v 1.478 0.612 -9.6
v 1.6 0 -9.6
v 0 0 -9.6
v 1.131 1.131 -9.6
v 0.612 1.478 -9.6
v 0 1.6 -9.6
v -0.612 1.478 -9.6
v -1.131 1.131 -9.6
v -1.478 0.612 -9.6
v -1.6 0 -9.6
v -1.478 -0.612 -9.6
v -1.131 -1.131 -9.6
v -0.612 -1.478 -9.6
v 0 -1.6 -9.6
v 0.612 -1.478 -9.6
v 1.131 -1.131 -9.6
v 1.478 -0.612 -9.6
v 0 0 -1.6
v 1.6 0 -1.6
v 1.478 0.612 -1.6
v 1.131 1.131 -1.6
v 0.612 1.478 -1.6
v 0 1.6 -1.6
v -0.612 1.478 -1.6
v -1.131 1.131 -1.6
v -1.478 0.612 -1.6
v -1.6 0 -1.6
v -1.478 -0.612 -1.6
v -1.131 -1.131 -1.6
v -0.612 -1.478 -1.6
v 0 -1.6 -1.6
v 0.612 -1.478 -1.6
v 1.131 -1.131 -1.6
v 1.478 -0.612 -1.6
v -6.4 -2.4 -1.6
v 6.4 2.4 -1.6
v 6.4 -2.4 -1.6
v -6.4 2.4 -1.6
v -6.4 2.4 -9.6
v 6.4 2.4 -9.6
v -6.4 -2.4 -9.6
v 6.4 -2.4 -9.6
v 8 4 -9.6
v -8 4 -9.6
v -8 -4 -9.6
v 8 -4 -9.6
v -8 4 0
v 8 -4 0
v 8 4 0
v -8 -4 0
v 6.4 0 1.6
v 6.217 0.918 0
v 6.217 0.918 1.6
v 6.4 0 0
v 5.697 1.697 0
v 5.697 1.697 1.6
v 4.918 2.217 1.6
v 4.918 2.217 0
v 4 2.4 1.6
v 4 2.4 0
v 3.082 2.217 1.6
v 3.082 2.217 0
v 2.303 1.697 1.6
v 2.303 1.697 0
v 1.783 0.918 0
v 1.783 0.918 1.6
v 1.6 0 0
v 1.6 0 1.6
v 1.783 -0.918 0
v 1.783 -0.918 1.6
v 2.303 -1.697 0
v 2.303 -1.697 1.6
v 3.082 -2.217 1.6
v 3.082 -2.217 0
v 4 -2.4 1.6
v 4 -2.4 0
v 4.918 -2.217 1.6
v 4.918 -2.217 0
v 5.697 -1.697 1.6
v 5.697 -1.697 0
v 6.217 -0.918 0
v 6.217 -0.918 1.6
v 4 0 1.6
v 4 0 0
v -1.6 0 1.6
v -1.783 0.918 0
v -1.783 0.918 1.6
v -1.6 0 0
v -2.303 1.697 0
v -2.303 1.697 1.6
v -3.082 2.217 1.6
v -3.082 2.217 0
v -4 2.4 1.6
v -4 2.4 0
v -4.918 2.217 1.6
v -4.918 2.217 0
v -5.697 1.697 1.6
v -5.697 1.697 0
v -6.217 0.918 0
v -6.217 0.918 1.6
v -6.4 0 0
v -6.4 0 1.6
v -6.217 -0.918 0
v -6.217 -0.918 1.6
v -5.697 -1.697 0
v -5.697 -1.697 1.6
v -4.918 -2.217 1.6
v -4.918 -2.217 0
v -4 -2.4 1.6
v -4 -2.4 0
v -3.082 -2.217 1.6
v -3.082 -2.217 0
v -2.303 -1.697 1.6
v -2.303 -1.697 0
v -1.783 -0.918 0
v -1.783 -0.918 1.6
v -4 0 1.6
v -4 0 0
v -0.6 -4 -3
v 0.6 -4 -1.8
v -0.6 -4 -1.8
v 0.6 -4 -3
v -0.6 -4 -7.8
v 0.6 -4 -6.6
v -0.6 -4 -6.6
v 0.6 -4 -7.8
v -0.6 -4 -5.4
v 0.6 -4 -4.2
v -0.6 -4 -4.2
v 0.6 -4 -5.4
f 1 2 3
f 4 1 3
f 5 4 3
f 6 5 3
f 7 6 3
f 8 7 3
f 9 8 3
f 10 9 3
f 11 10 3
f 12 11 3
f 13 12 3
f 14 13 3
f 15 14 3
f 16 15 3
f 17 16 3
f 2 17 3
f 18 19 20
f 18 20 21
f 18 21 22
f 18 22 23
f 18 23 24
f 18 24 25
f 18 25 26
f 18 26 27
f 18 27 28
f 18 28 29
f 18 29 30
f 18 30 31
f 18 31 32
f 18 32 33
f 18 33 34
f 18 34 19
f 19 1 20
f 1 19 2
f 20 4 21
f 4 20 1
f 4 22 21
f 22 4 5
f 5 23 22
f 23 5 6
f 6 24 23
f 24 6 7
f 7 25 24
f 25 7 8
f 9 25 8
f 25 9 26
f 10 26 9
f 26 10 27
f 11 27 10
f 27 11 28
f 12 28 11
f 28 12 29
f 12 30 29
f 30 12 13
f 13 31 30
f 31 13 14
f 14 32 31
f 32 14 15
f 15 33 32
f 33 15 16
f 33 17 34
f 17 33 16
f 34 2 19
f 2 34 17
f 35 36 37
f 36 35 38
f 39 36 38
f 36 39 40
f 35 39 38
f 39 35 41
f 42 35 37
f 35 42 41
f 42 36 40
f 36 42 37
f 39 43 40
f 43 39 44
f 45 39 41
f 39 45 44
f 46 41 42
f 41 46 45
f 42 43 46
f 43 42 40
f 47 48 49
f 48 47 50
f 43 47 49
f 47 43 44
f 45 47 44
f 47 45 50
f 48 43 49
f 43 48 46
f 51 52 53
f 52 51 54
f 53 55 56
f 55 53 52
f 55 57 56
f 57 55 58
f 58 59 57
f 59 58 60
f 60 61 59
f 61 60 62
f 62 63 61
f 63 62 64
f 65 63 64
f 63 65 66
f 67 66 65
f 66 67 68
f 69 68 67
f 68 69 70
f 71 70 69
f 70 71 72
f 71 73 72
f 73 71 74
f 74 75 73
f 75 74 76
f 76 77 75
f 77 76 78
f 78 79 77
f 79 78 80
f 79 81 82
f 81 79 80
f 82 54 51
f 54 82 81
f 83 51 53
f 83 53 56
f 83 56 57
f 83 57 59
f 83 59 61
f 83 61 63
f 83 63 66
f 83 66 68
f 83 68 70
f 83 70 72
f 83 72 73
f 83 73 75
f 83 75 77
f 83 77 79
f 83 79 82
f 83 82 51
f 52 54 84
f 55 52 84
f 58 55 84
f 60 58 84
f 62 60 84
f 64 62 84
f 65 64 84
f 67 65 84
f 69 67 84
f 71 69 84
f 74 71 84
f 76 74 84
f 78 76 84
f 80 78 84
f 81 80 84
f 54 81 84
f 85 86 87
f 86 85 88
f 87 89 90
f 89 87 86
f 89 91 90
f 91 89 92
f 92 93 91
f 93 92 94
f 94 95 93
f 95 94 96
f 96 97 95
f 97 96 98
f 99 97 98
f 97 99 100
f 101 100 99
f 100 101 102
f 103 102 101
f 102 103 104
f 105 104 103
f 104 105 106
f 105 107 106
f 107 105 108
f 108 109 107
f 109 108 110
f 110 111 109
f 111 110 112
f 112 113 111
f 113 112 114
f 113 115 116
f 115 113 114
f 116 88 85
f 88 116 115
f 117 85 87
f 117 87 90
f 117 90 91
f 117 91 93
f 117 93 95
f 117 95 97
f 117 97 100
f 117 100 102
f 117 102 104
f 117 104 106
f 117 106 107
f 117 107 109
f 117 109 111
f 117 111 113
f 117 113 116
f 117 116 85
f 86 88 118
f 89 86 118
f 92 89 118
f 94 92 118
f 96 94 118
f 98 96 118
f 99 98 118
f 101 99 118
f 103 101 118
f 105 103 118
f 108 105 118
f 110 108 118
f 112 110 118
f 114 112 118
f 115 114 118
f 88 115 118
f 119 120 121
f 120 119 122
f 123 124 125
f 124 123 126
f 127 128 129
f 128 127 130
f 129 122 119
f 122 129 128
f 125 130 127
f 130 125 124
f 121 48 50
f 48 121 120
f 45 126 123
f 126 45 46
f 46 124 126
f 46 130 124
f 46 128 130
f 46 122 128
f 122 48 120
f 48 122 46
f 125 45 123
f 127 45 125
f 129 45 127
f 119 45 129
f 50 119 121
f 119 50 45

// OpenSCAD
// file: ../p/4-4edge.scad
use <../lib.scad>
function ldraw_lib__4_4edge() = [
// 0 Circle 1.0
// 0 Name: 4-4edge.dat
// 0 Author: James Jessiman
// 0 !LDRAW_ORG Primitive UPDATE 2017-01
// 0 !LICENSE Licensed under CC BY 2.0 and CC BY 4.0 : see CAreadme.txt
// 
// 0 BFC CERTIFY CCW
  [0,"BFC","CERTIFY"],
  [0,"BFC","CCW"],
// 
// 0 !HISTORY 1998-12-15 [PTadmin] Official Update 1998-10
// 0 !HISTORY 2005-12-28 [PTadmin] Official Update 2005-01
// 0 !HISTORY 2007-06-24 [PTadmin] Header formatted for Contributor Agreement
// 0 !HISTORY 2008-07-01 [PTadmin] Official Update 2008-01
// 0 !HISTORY 2017-01-15 [Steffen] BFCed
// 0 !HISTORY 2017-12-30 [PTadmin] Official Update 2017-01
// 
// 
// 2 24 1 0 0 0.9239 0 0.3827
  [2,24,1,0,0,0.9239,0,0.3827],
// 2 24 0.9239 0 0.3827 0.7071 0 0.7071
  [2,24,0.9239,0,0.3827,0.7071,0,0.7071],
// 2 24 0.7071 0 0.7071 0.3827 0 0.9239
  [2,24,0.7071,0,0.7071,0.3827,0,0.9239],
// 2 24 0.3827 0 0.9239 0 0 1
  [2,24,0.3827,0,0.9239,0,0,1],
// 2 24 0 0 1 -0.3827 0 0.9239
  [2,24,0,0,1,-0.3827,0,0.9239],
// 2 24 -0.3827 0 0.9239 -0.7071 0 0.7071
  [2,24,-0.3827,0,0.9239,-0.7071,0,0.7071],
// 2 24 -0.7071 0 0.7071 -0.9239 0 0.3827
  [2,24,-0.7071,0,0.7071,-0.9239,0,0.3827],
// 2 24 -0.9239 0 0.3827 -1 0 -0
  [2,24,-0.9239,0,0.3827,-1,0,-0],
// 2 24 -1 0 -0 -0.9239 0 -0.3827
  [2,24,-1,0,-0,-0.9239,0,-0.3827],
// 2 24 -0.9239 0 -0.3827 -0.7071 0 -0.7071
  [2,24,-0.9239,0,-0.3827,-0.7071,0,-0.7071],
// 2 24 -0.7071 0 -0.7071 -0.3827 0 -0.9239
  [2,24,-0.7071,0,-0.7071,-0.3827,0,-0.9239],
// 2 24 -0.3827 0 -0.9239 0 0 -1
  [2,24,-0.3827,0,-0.9239,0,0,-1],
// 2 24 0 0 -1 0.3827 0 -0.9239
  [2,24,0,0,-1,0.3827,0,-0.9239],
// 2 24 0.3827 0 -0.9239 0.7071 0 -0.7071
  [2,24,0.3827,0,-0.9239,0.7071,0,-0.7071],
// 2 24 0.7071 0 -0.7071 0.9239 0 -0.3827
  [2,24,0.7071,0,-0.7071,0.9239,0,-0.3827],
// 2 24 0.9239 0 -0.3827 1 0 0
  [2,24,0.9239,0,-0.3827,1,0,0],
];
module ldraw_lib__4_4edge(step=0, col=false, unit=2/5, alt=false, line=0.2, solid=!$preview)
    makepoly(ldraw_lib__4_4edge(), step=step, col=col, unit=unit, alt=alt, line=line, solid=solid);
ldraw_lib__4_4edge(line=0.2);
// file: ../p/4-4disc.scad
use <../lib.scad>
function ldraw_lib__4_4disc() = [
// 0 Disc 1.0
// 0 Name: 4-4disc.dat
// 0 Author: James Jessiman
// 0 !LDRAW_ORG Primitive UPDATE 2002-02
// 0 !LICENSE Licensed under CC BY 2.0 and CC BY 4.0 : see CAreadme.txt
// 
// 0 BFC CERTIFY CCW
  [0,"BFC","CERTIFY"],
  [0,"BFC","CCW"],
// 
// 0 !HISTORY 1998-12-15 [PTadmin] Official Update 1998-10
// 0 !HISTORY 2002-03-23 [sbliss] Added BFC statement
// 0 !HISTORY 2002-04-25 [PTadmin] Official Update 2002-02
// 0 !HISTORY 2007-06-24 [PTadmin] Header formatted for Contributor Agreement
// 0 !HISTORY 2008-07-01 [PTadmin] Official Update 2008-01
// 
// 
// 3 16 0 0 0 1 0 0 0.9239 0 0.3827
  [3,16,0,0,0,1,0,0,0.9239,0,0.3827],
// 3 16 0 0 0 0.9239 0 0.3827 0.7071 0 0.7071
  [3,16,0,0,0,0.9239,0,0.3827,0.7071,0,0.7071],
// 3 16 0 0 0 0.7071 0 0.7071 0.3827 0 0.9239
  [3,16,0,0,0,0.7071,0,0.7071,0.3827,0,0.9239],
// 3 16 0 0 0 0.3827 0 0.9239 0 0 1
  [3,16,0,0,0,0.3827,0,0.9239,0,0,1],
// 3 16 0 0 0 0 0 1 -0.3827 0 0.9239
  [3,16,0,0,0,0,0,1,-0.3827,0,0.9239],
// 3 16 0 0 0 -0.3827 0 0.9239 -0.7071 0 0.7071
  [3,16,0,0,0,-0.3827,0,0.9239,-0.7071,0,0.7071],
// 3 16 0 0 0 -0.7071 0 0.7071 -0.9239 0 0.3827
  [3,16,0,0,0,-0.7071,0,0.7071,-0.9239,0,0.3827],
// 3 16 0 0 0 -0.9239 0 0.3827 -1 0 -0
  [3,16,0,0,0,-0.9239,0,0.3827,-1,0,-0],
// 3 16 0 0 0 -1 0 -0 -0.9239 0 -0.3827
  [3,16,0,0,0,-1,0,-0,-0.9239,0,-0.3827],
// 3 16 0 0 0 -0.9239 0 -0.3827 -0.7071 0 -0.7071
  [3,16,0,0,0,-0.9239,0,-0.3827,-0.7071,0,-0.7071],
// 3 16 0 0 0 -0.7071 0 -0.7071 -0.3827 0 -0.9239
  [3,16,0,0,0,-0.7071,0,-0.7071,-0.3827,0,-0.9239],
// 3 16 0 0 0 -0.3827 0 -0.9239 0 0 -1
  [3,16,0,0,0,-0.3827,0,-0.9239,0,0,-1],
// 3 16 0 0 0 0 0 -1 0.3827 0 -0.9239
  [3,16,0,0,0,0,0,-1,0.3827,0,-0.9239],
// 3 16 0 0 0 0.3827 0 -0.9239 0.7071 0 -0.7071
  [3,16,0,0,0,0.3827,0,-0.9239,0.7071,0,-0.7071],
// 3 16 0 0 0 0.7071 0 -0.7071 0.9239 0 -0.3827
  [3,16,0,0,0,0.7071,0,-0.7071,0.9239,0,-0.3827],
// 3 16 0 0 0 0.9239 0 -0.3827 1 0 0
  [3,16,0,0,0,0.9239,0,-0.3827,1,0,0],
// 0
];
module ldraw_lib__4_4disc(step=0, col=false, unit=2/5, alt=false, line=0.2, solid=!$preview)
    makepoly(ldraw_lib__4_4disc(), step=step, col=col, unit=unit, alt=alt, line=line, solid=solid);
ldraw_lib__4_4disc(line=0.2);
// file: ../p/4-4cyli.scad
use <../lib.scad>
function ldraw_lib__4_4cyli() = [
// 0 Cylinder 1.0
// 0 Name: 4-4cyli.dat
// 0 Author: James Jessiman
// 0 !LDRAW_ORG Primitive UPDATE 2005-01
// 0 !LICENSE Licensed under CC BY 4.0 : see CAreadme.txt
// 
// 0 BFC CERTIFY CCW
  [0,"BFC","CERTIFY"],
  [0,"BFC","CCW"],
// 
// 0 !HISTORY 1998-12-15 [PTadmin] Official Update 1998-10
// 0 !HISTORY 2002-03-23 [sbliss] Added BFC statement; merged headers from files in distributions LDraw 0.27 and Complete.
// 0 !HISTORY 2002-04-25 [PTadmin] Official Update 2002-02
// 0 !HISTORY 2004-12-14 [guyvivan] BFC CCW
// 0 !HISTORY 2005-12-28 [PTadmin] Official Update 2005-01
// 0 !HISTORY 2007-06-24 [PTadmin] Header formatted for Contributor Agreement
// 0 !HISTORY 2008-07-01 [PTadmin] Official Update 2008-01
// 
// 
// 4 16 1 1 0 0.9239 1 0.3827 0.9239 0 0.3827 1 0 0
  [4,16,1,1,0,0.9239,1,0.3827,0.9239,0,0.3827,1,0,0],
// 5 24 1 0 0 1 1 0 0.9239 0 0.3827 0.9239 0 -0.3827
  [5,24,1,0,0,1,1,0,0.9239,0,0.3827,0.9239,0,-0.3827],
// 4 16 0.9239 1 0.3827 0.7071 1 0.7071 0.7071 0 0.7071 0.9239 0 0.3827
  [4,16,0.9239,1,0.3827,0.7071,1,0.7071,0.7071,0,0.7071,0.9239,0,0.3827],
// 5 24 0.9239 0 0.3827 0.9239 1 0.3827 0.7071 0 0.7071 1 0 0
  [5,24,0.9239,0,0.3827,0.9239,1,0.3827,0.7071,0,0.7071,1,0,0],
// 4 16 0.7071 1 0.7071 0.3827 1 0.9239 0.3827 0 0.9239 0.7071 0 0.7071
  [4,16,0.7071,1,0.7071,0.3827,1,0.9239,0.3827,0,0.9239,0.7071,0,0.7071],
// 5 24 0.7071 0 0.7071 0.7071 1 0.7071 0.3827 0 0.9239 0.9239 0 0.3827
  [5,24,0.7071,0,0.7071,0.7071,1,0.7071,0.3827,0,0.9239,0.9239,0,0.3827],
// 4 16 0.3827 1 0.9239 0 1 1 0 0 1 0.3827 0 0.9239
  [4,16,0.3827,1,0.9239,0,1,1,0,0,1,0.3827,0,0.9239],
// 5 24 0.3827 0 0.9239 0.3827 1 0.9239 0 0 1 0.7071 0 0.7071
  [5,24,0.3827,0,0.9239,0.3827,1,0.9239,0,0,1,0.7071,0,0.7071],
// 4 16 0 1 1 -0.3827 1 0.9239 -0.3827 0 0.9239 0 0 1
  [4,16,0,1,1,-0.3827,1,0.9239,-0.3827,0,0.9239,0,0,1],
// 5 24 0 0 1 0 1 1 -0.3827 0 0.9239 0.3827 0 0.9239
  [5,24,0,0,1,0,1,1,-0.3827,0,0.9239,0.3827,0,0.9239],
// 4 16 -0.3827 1 0.9239 -0.7071 1 0.7071 -0.7071 0 0.7071 -0.3827 0 0.9239
  [4,16,-0.3827,1,0.9239,-0.7071,1,0.7071,-0.7071,0,0.7071,-0.3827,0,0.9239],
// 5 24 -0.3827 0 0.9239 -0.3827 1 0.9239 -0.7071 0 0.7071 0 0 1
  [5,24,-0.3827,0,0.9239,-0.3827,1,0.9239,-0.7071,0,0.7071,0,0,1],
// 4 16 -0.7071 1 0.7071 -0.9239 1 0.3827 -0.9239 0 0.3827 -0.7071 0 0.7071
  [4,16,-0.7071,1,0.7071,-0.9239,1,0.3827,-0.9239,0,0.3827,-0.7071,0,0.7071],
// 5 24 -0.7071 0 0.7071 -0.7071 1 0.7071 -0.9239 0 0.3827 -0.3827 0 0.9239
  [5,24,-0.7071,0,0.7071,-0.7071,1,0.7071,-0.9239,0,0.3827,-0.3827,0,0.9239],
// 4 16 -0.9239 1 0.3827 -1 1 0 -1 0 0 -0.9239 0 0.3827
  [4,16,-0.9239,1,0.3827,-1,1,0,-1,0,0,-0.9239,0,0.3827],
// 5 24 -0.9239 0 0.3827 -0.9239 1 0.3827 -1 0 0 -0.7071 0 0.7071
  [5,24,-0.9239,0,0.3827,-0.9239,1,0.3827,-1,0,0,-0.7071,0,0.7071],
// 4 16 -1 1 0 -0.9239 1 -0.3827 -0.9239 0 -0.3827 -1 0 0
  [4,16,-1,1,0,-0.9239,1,-0.3827,-0.9239,0,-0.3827,-1,0,0],
// 5 24 -1 0 0 -1 1 0 -0.9239 0 -0.3827 -0.9239 0 0.3827
  [5,24,-1,0,0,-1,1,0,-0.9239,0,-0.3827,-0.9239,0,0.3827],
// 4 16 -0.9239 1 -0.3827 -0.7071 1 -0.7071 -0.7071 0 -0.7071 -0.9239 0 -0.3827
  [4,16,-0.9239,1,-0.3827,-0.7071,1,-0.7071,-0.7071,0,-0.7071,-0.9239,0,-0.3827],
// 5 24 -0.9239 0 -0.3827 -0.9239 1 -0.3827 -0.7071 0 -0.7071 -1 0 0
  [5,24,-0.9239,0,-0.3827,-0.9239,1,-0.3827,-0.7071,0,-0.7071,-1,0,0],
// 4 16 -0.7071 1 -0.7071 -0.3827 1 -0.9239 -0.3827 0 -0.9239 -0.7071 0 -0.7071
  [4,16,-0.7071,1,-0.7071,-0.3827,1,-0.9239,-0.3827,0,-0.9239,-0.7071,0,-0.7071],
// 5 24 -0.7071 0 -0.7071 -0.7071 1 -0.7071 -0.3827 0 -0.9239 -0.9239 0 -0.3827
  [5,24,-0.7071,0,-0.7071,-0.7071,1,-0.7071,-0.3827,0,-0.9239,-0.9239,0,-0.3827],
// 4 16 -0.3827 1 -0.9239 0 1 -1 0 0 -1 -0.3827 0 -0.9239
  [4,16,-0.3827,1,-0.9239,0,1,-1,0,0,-1,-0.3827,0,-0.9239],
// 5 24 -0.3827 0 -0.9239 -0.3827 1 -0.9239 0 0 -1 -0.7071 0 -0.7071
  [5,24,-0.3827,0,-0.9239,-0.3827,1,-0.9239,0,0,-1,-0.7071,0,-0.7071],
// 4 16 0 1 -1 0.3827 1 -0.9239 0.3827 0 -0.9239 0 0 -1
  [4,16,0,1,-1,0.3827,1,-0.9239,0.3827,0,-0.9239,0,0,-1],
// 5 24 0 0 -1 0 1 -1 0.3827 0 -0.9239 -0.3827 0 -0.9239
  [5,24,0,0,-1,0,1,-1,0.3827,0,-0.9239,-0.3827,0,-0.9239],
// 4 16 0.3827 1 -0.9239 0.7071 1 -0.7071 0.7071 0 -0.7071 0.3827 0 -0.9239
  [4,16,0.3827,1,-0.9239,0.7071,1,-0.7071,0.7071,0,-0.7071,0.3827,0,-0.9239],
// 5 24 0.3827 0 -0.9239 0.3827 1 -0.9239 0.7071 0 -0.7071 0 0 -1
  [5,24,0.3827,0,-0.9239,0.3827,1,-0.9239,0.7071,0,-0.7071,0,0,-1],
// 4 16 0.7071 1 -0.7071 0.9239 1 -0.3827 0.9239 0 -0.3827 0.7071 0 -0.7071
  [4,16,0.7071,1,-0.7071,0.9239,1,-0.3827,0.9239,0,-0.3827,0.7071,0,-0.7071],
// 5 24 0.7071 0 -0.7071 0.7071 1 -0.7071 0.9239 0 -0.3827 0.3827 0 -0.9239
  [5,24,0.7071,0,-0.7071,0.7071,1,-0.7071,0.9239,0,-0.3827,0.3827,0,-0.9239],
// 4 16 0.9239 1 -0.3827 1 1 0 1 0 0 0.9239 0 -0.3827
  [4,16,0.9239,1,-0.3827,1,1,0,1,0,0,0.9239,0,-0.3827],
// 5 24 0.9239 0 -0.3827 0.9239 1 -0.3827 1 0 0 0.7071 0 -0.7071
  [5,24,0.9239,0,-0.3827,0.9239,1,-0.3827,1,0,0,0.7071,0,-0.7071],
// 0
];
module ldraw_lib__4_4cyli(step=0, col=false, unit=2/5, alt=false, line=0.2, solid=!$preview)
    makepoly(ldraw_lib__4_4cyli(), step=step, col=col, unit=unit, alt=alt, line=line, solid=solid);
ldraw_lib__4_4cyli(line=0.2);
// file: ../p/stud3.scad
use <../lib.scad>
use <4-4cyli.scad>
use <4-4disc.scad>
use <4-4edge.scad>
function ldraw_lib__stud3() = [
// 0 Stud Tube Solid
// 0 Name: stud3.dat
// 0 Author: James Jessiman
// 0 !LDRAW_ORG Primitive UPDATE 2012-01
// 0 !LICENSE Licensed under CC BY 4.0 : see CAreadme.txt
// 
// 0 BFC CERTIFY CCW
  [0,"BFC","CERTIFY"],
  [0,"BFC","CCW"],
// 
// 0 !HISTORY 2002-04-04 [sbliss] Modified for BFC compliance
// 0 !HISTORY 2002-04-25 [PTadmin] Official Update 2002-02
// 0 !HISTORY 2007-06-24 [PTadmin] Header formatted for Contributor Agreement
// 0 !HISTORY 2008-07-01 [PTadmin] Official Update 2008-01
// 0 !HISTORY 2012-02-16 [Philo] Changed to CCW
// 0 !HISTORY 2012-03-30 [PTadmin] Official Update 2012-01
// 
// 
// 1 16 0 -4 0 4 0 0 0 1 0 0 0 4 4-4edge.dat
  [1,16,0,-4,0,4,0,0,0,1,0,0,0,4, ldraw_lib__4_4edge()],
// 1 16 0 0 0 4 0 0 0 1 0 0 0 4 4-4edge.dat
  [1,16,0,0,0,4,0,0,0,1,0,0,0,4, ldraw_lib__4_4edge()],
// 1 16 0 -4 0 4 0 0 0 1 0 0 0 4 4-4disc.dat
  [1,16,0,-4,0,4,0,0,0,1,0,0,0,4, ldraw_lib__4_4disc()],
  [-1,16,0,0,0,4,0,0,0,-1,0,0,0,4, ldraw_lib__4_4disc()],
// 1 16 0 -4 0 4 0 0 0 4 0 0 0 4 4-4cyli.dat
  [1,16,0,-4,0,4,0,0,0,4,0,0,0,4, ldraw_lib__4_4cyli()],
];
module ldraw_lib__stud3(step=0, col=false, unit=2/5, alt=false, line=0.2, solid=!$preview)
    makepoly(ldraw_lib__stud3(), step=step, col=col, unit=unit, alt=alt, line=line, solid=solid);
ldraw_lib__stud3(line=0.2);
// file: ../p/stud.scad
use <../lib.scad>
use <4-4cyli.scad>
use <4-4disc.scad>
use <4-4edge.scad>
function ldraw_lib__stud() = [
// 0 Stud
// 0 Name: stud.dat
// 0 Author: James Jessiman
// 0 !LDRAW_ORG Primitive UPDATE 2012-01
// 0 !LICENSE Licensed under CC BY 4.0 : see CAreadme.txt
// 
// 0 BFC CERTIFY CCW
  [0,"BFC","CERTIFY"],
  [0,"BFC","CCW"],
// 
// 0 !HISTORY 2002-04-04 [sbliss] Modified for BFC compliance
// 0 !HISTORY 2002-04-25 [PTadmin] Official Update 2002-02
// 0 !HISTORY 2007-06-24 [PTadmin] Header formatted for Contributor Agreement
// 0 !HISTORY 2008-07-01 [PTadmin] Official Update 2008-01
// 0 !HISTORY 2012-02-16 [Philo] Changed to CCW
// 0 !HISTORY 2012-03-30 [PTadmin] Official Update 2012-01
// 
// 
// 1 16 0 0 0 6 0 0 0 1 0 0 0 6 4-4edge.dat
  [1,16,0,0,0,6,0,0,0,1,0,0,0,6, ldraw_lib__4_4edge()],
// 1 16 0 -4 0 6 0 0 0 1 0 0 0 6 4-4edge.dat
  [1,16,0,-4,0,6,0,0,0,1,0,0,0,6, ldraw_lib__4_4edge()],
// 1 16 0 0 0 6 0 0 0 -4 0 0 0 6 4-4cyli.dat
  [1,16,0,0,0,6,0,0,0,-4,0,0,0,6, ldraw_lib__4_4cyli()],
// 1 16 0 -4 0 6 0 0 0 1 0 0 0 6 4-4disc.dat
  [1,16,0,-4,0,6,0,0,0,1,0,0,0,6, ldraw_lib__4_4disc()],
  [-1,16,0,0,0,6,0,0,0,-1,0,0,0,6, ldraw_lib__4_4disc()],
];
module ldraw_lib__stud(step=0, col=false, unit=2/5, alt=false, line=0.2, solid=!$preview)
    makepoly(ldraw_lib__stud(), step=step, col=col, unit=unit, alt=alt, line=line, solid=solid);
ldraw_lib__stud(line=0.2);
// file: ../p/box5.scad
use <../lib.scad>
function ldraw_lib__box5() = [
// 0 Box with 5 Faces and All Edges
// 0 Name: box5.dat
// 0 Author: James Jessiman
// 0 !LDRAW_ORG Primitive UPDATE 2012-01
// 0 !LICENSE Licensed under CC BY 2.0 and CC BY 4.0 : see CAreadme.txt
// 
// 0 BFC CERTIFY CCW
  [0,"BFC","CERTIFY"],
  [0,"BFC","CCW"],
// 
// 0 !HISTORY 2002-04-03 [sbliss] Modified for BFC compliance
// 0 !HISTORY 2002-04-25 [PTadmin] Official Update 2002-02
// 0 !HISTORY 2007-06-24 [PTadmin] Header formatted for Contributor Agreement
// 0 !HISTORY 2008-07-01 [PTadmin] Official Update 2008-01
// 0 !HISTORY 2012-02-16 [Philo] Changed to CCW
// 0 !HISTORY 2012-03-30 [PTadmin] Official Update 2012-01
// 
// 
// 2 24 1 1 1 -1 1 1
  [2,24,1,1,1,-1,1,1],
// 2 24 -1 1 1 -1 1 -1
  [2,24,-1,1,1,-1,1,-1],
// 2 24 -1 1 -1 1 1 -1
  [2,24,-1,1,-1,1,1,-1],
// 2 24 1 1 -1 1 1 1
  [2,24,1,1,-1,1,1,1],
// 2 24 1 0 1 -1 0 1
  [2,24,1,0,1,-1,0,1],
// 2 24 -1 0 1 -1 0 -1
  [2,24,-1,0,1,-1,0,-1],
// 2 24 -1 0 -1 1 0 -1
  [2,24,-1,0,-1,1,0,-1],
// 2 24 1 0 -1 1 0 1
  [2,24,1,0,-1,1,0,1],
// 2 24 1 0 1 1 1 1
  [2,24,1,0,1,1,1,1],
// 2 24 -1 0 1 -1 1 1
  [2,24,-1,0,1,-1,1,1],
// 2 24 1 0 -1 1 1 -1
  [2,24,1,0,-1,1,1,-1],
// 2 24 -1 0 -1 -1 1 -1
  [2,24,-1,0,-1,-1,1,-1],
// 4 16 -1 1 1 1 1 1 1 1 -1 -1 1 -1
  [4,16,-1,1,1,1,1,1,1,1,-1,-1,1,-1],
// 4 16 -1 1 1 -1 0 1 1 0 1 1 1 1
  [4,16,-1,1,1,-1,0,1,1,0,1,1,1,1],
// 4 16 -1 1 -1 -1 0 -1 -1 0 1 -1 1 1
  [4,16,-1,1,-1,-1,0,-1,-1,0,1,-1,1,1],
// 4 16 1 1 -1 1 0 -1 -1 0 -1 -1 1 -1
  [4,16,1,1,-1,1,0,-1,-1,0,-1,-1,1,-1],
// 4 16 1 1 1 1 0 1 1 0 -1 1 1 -1
  [4,16,1,1,1,1,0,1,1,0,-1,1,1,-1],
];
makepoly(ldraw_lib__box5(), line=0.2);
// file: ../p/box4t.scad
use <../lib.scad>
function ldraw_lib__box4t() = [
// 0 Box with 4 Adjacent Faces and All Edges
// 0 Name: box4t.dat
// 0 Author: Tore Eriksson [Tore_Eriksson]
// 0 !LDRAW_ORG Primitive UPDATE 2003-02
// 0 !LICENSE Licensed under CC BY 4.0 : see CAreadme.txt
// 
// 0 BFC CERTIFY CCW
  [0,"BFC","CERTIFY"],
  [0,"BFC","CCW"],
// 
// 0 !HISTORY 1997-09-29 [PTadmin] Official Update 1997-15
// 0 !HISTORY 2002-08-31 [izanette] Modified with WINDZ for BFC compliance
// 0 !HISTORY 2003-08-01 [PTadmin] Official Update 2003-02
// 0 !HISTORY 2007-06-24 [PTadmin] Header formatted for Contributor Agreement
// 0 !HISTORY 2008-07-01 [PTadmin] Official Update 2008-01
// 
// 
// 2 24 1 1 1 -1 1 1
  [2,24,1,1,1,-1,1,1],
// 2 24 -1 1 1 -1 1 -1
  [2,24,-1,1,1,-1,1,-1],
// 2 24 -1 1 -1 1 1 -1
  [2,24,-1,1,-1,1,1,-1],
// 2 24 1 1 -1 1 1 1
  [2,24,1,1,-1,1,1,1],
// 2 24 1 0 1 -1 0 1
  [2,24,1,0,1,-1,0,1],
// 2 24 -1 0 1 -1 0 -1
  [2,24,-1,0,1,-1,0,-1],
// 2 24 -1 0 -1 1 0 -1
  [2,24,-1,0,-1,1,0,-1],
// 2 24 1 0 -1 1 0 1
  [2,24,1,0,-1,1,0,1],
// 2 24 1 0 1 1 1 1
  [2,24,1,0,1,1,1,1],
// 2 24 -1 0 1 -1 1 1
  [2,24,-1,0,1,-1,1,1],
// 2 24 1 0 -1 1 1 -1
  [2,24,1,0,-1,1,1,-1],
// 2 24 -1 0 -1 -1 1 -1
  [2,24,-1,0,-1,-1,1,-1],
// 4 16 1 1 1 1 1 -1 -1 1 -1 -1 1 1
  [4,16,1,1,1,1,1,-1,-1,1,-1,-1,1,1],
// 4 16 1 1 1 -1 1 1 -1 0 1 1 0 1
  [4,16,1,1,1,-1,1,1,-1,0,1,1,0,1],
// 4 16 -1 1 1 -1 1 -1 -1 0 -1 -1 0 1
  [4,16,-1,1,1,-1,1,-1,-1,0,-1,-1,0,1],
// 0 4 16 -1 1 -1 -1 0 -1 1 0 -1 1 1 -1
// 4 16 1 1 -1 1 1 1 1 0 1 1 0 -1
  [4,16,1,1,-1,1,1,1,1,0,1,1,0,-1],
// 0
];
module ldraw_lib__box4t(step=0, col=false, unit=2/5, alt=false, line=0.2, solid=!$preview)
    makepoly(ldraw_lib__box4t(), step=step, col=col, unit=unit, alt=alt, line=line, solid=solid);
ldraw_lib__box4t(line=0.2);
// file: s/3004s01.scad
use <../../lib.scad>
use <../../p/box4t.scad>
use <../../p/box5.scad>
use <../../p/stud.scad>
use <../../p/stud3.scad>
function ldraw_lib__s__3004s01() = [
// 0 ~Brick  1 x  2 without Front Face
// 0 Name: s\3004s01.dat
// 0 Author: James Jessiman
// 0 !LDRAW_ORG Subpart UPDATE 2003-03
// 0 !LICENSE Licensed under CC BY 4.0 : see CAreadme.txt
// 
// 0 BFC CERTIFY CCW
  [0,"BFC","CERTIFY"],
  [0,"BFC","CCW"],
// 
// 0 !HISTORY 2003-09-07 [jriley] Subfiling, BFC
// 0 !HISTORY 2003-12-19 [PTadmin] Official Update 2003-03
// 0 !HISTORY 2007-08-29 [PTadmin] Header formatted for Contributor Agreement
// 0 !HISTORY 2008-07-01 [PTadmin] Official Update 2008-01
// 
// 
// 1 16 0 4 0 1 0 0 0 -5 0 0 0 1 stud3.dat
  [1,16,0,4,0,1,0,0,0,-5,0,0,0,1, ldraw_lib__stud3()],
// 0 BFC INVERTNEXT
  [0,"BFC","INVERTNEXT"],
// 1 16 0 24 0 16 0 0 0 -20 0 0 0 6 box5.dat
  [1,16,0,24,0,16,0,0,0,-20,0,0,0,6, ldraw_lib__box5()],
// 4 16 20 24 10 16 24 6 -16 24 6 -20 24 10
  [4,16,20,24,10,16,24,6,-16,24,6,-20,24,10],
// 4 16 -20 24 10 -16 24 6 -16 24 -6 -20 24 -10
  [4,16,-20,24,10,-16,24,6,-16,24,-6,-20,24,-10],
// 4 16 -20 24 -10 -16 24 -6 16 24 -6 20 24 -10
  [4,16,-20,24,-10,-16,24,-6,16,24,-6,20,24,-10],
// 4 16 20 24 -10 16 24 -6 16 24 6 20 24 10
  [4,16,20,24,-10,16,24,-6,16,24,6,20,24,10],
// 1 16 0 24 0 20 0 0 0 -24 0 0 0 10 box4t.dat
  [1,16,0,24,0,20,0,0,0,-24,0,0,0,10, ldraw_lib__box4t()],
// 1 16 10 0 0 1 0 0 0 1 0 0 0 1 stud.dat
  [1,16,10,0,0,1,0,0,0,1,0,0,0,1, ldraw_lib__stud()],
// 1 16 -10 0 0 1 0 0 0 1 0 0 0 1 stud.dat
  [1,16,-10,0,0,1,0,0,0,1,0,0,0,1, ldraw_lib__stud()],
// 0
];
module ldraw_lib__s__3004s01(step=0, col=false, unit=2/5, alt=false, line=0.2, solid=!$preview)
    makepoly(ldraw_lib__s__3004s01(), step=step, col=col, unit=unit, alt=alt, line=line, solid=solid);
ldraw_lib__s__3004s01(line=0.2);
// main file
use <../lib.scad>
use <s/3004s01.scad>
function ldraw_lib__3004px8() = [
// 0 Brick  1 x  2 with  3 Black Squares Vertical Pattern
// 0 Name: 3004px8.dat
// 0 Author: Evert-Jan Boer [ejboer]
// 0 !LDRAW_ORG Part UPDATE 2022-01
// 0 !LICENSE Licensed under CC BY 4.0 : see CAreadme.txt
// 
// 0 BFC CERTIFY CCW
  [0,"BFC","CERTIFY"],
  [0,"BFC","CCW"],
// 
// 0 !KEYWORDS Bricklink 3004pb138, Minecraft, Set 21120, Set 21131, Snow Golem
// 
// 0 !HISTORY 2022-01-14 [PTadmin] Official Update 2022-01
// 
// 
// 1 16 0 0 0 1 0 0 0 1 0 0 0 1 s\3004s01.dat
  [1,16,0,0,0,1,0,0,0,1,0,0,0,1, ldraw_lib__s__3004s01()],
// 
// 4 0 1.5 4.5 -10 -1.5 4.5 -10 -1.5 7.5 -10 1.5 7.5 -10
  [4,0,1.5,4.5,-10,-1.5,4.5,-10,-1.5,7.5,-10,1.5,7.5,-10],
// 4 0 1.5 16.5 -10 -1.5 16.5 -10 -1.5 19.5 -10 1.5 19.5 -10
  [4,0,1.5,16.5,-10,-1.5,16.5,-10,-1.5,19.5,-10,1.5,19.5,-10],
// 4 0 1.5 10.5 -10 -1.5 10.5 -10 -1.5 13.5 -10 1.5 13.5 -10
  [4,0,1.5,10.5,-10,-1.5,10.5,-10,-1.5,13.5,-10,1.5,13.5,-10],
// 4 16 1.5 7.5 -10 -1.5 7.5 -10 -1.5 10.5 -10 1.5 10.5 -10
  [4,16,1.5,7.5,-10,-1.5,7.5,-10,-1.5,10.5,-10,1.5,10.5,-10],
// 4 16 1.5 13.5 -10 -1.5 13.5 -10 -1.5 16.5 -10 1.5 16.5 -10
  [4,16,1.5,13.5,-10,-1.5,13.5,-10,-1.5,16.5,-10,1.5,16.5,-10],
// 4 16 -20 0 -10 -1.5 4.5 -10 1.5 4.5 -10 20 0 -10
  [4,16,-20,0,-10,-1.5,4.5,-10,1.5,4.5,-10,20,0,-10],
// 4 16 -1.5 19.5 -10 -20 24 -10 20 24 -10 1.5 19.5 -10
  [4,16,-1.5,19.5,-10,-20,24,-10,20,24,-10,1.5,19.5,-10],
// 3 16 20 24 -10 1.5 16.5 -10 1.5 19.5 -10
  [3,16,20,24,-10,1.5,16.5,-10,1.5,19.5,-10],
// 3 16 20 24 -10 1.5 13.5 -10 1.5 16.5 -10
  [3,16,20,24,-10,1.5,13.5,-10,1.5,16.5,-10],
// 3 16 20 24 -10 1.5 10.5 -10 1.5 13.5 -10
  [3,16,20,24,-10,1.5,10.5,-10,1.5,13.5,-10],
// 3 16 20 24 -10 1.5 7.5 -10 1.5 10.5 -10
  [3,16,20,24,-10,1.5,7.5,-10,1.5,10.5,-10],
// 4 16 1.5 4.5 -10 1.5 7.5 -10 20 24 -10 20 0 -10
  [4,16,1.5,4.5,-10,1.5,7.5,-10,20,24,-10,20,0,-10],
// 3 16 -1.5 16.5 -10 -20 24 -10 -1.5 19.5 -10
  [3,16,-1.5,16.5,-10,-20,24,-10,-1.5,19.5,-10],
// 3 16 -1.5 13.5 -10 -20 24 -10 -1.5 16.5 -10
  [3,16,-1.5,13.5,-10,-20,24,-10,-1.5,16.5,-10],
// 3 16 -1.5 10.5 -10 -20 24 -10 -1.5 13.5 -10
  [3,16,-1.5,10.5,-10,-20,24,-10,-1.5,13.5,-10],
// 3 16 -1.5 7.5 -10 -20 24 -10 -1.5 10.5 -10
  [3,16,-1.5,7.5,-10,-20,24,-10,-1.5,10.5,-10],
// 4 16 -20 24 -10 -1.5 7.5 -10 -1.5 4.5 -10 -20 0 -10
  [4,16,-20,24,-10,-1.5,7.5,-10,-1.5,4.5,-10,-20,0,-10],
];
module ldraw_lib__3004px8(step=0, col=false, unit=2/5, alt=false, line=0.2, solid=!$preview)
    makepoly(ldraw_lib__3004px8(), step=step, col=col, unit=unit, alt=alt, line=line, solid=solid);
ldraw_lib__3004px8(line=0.2);
